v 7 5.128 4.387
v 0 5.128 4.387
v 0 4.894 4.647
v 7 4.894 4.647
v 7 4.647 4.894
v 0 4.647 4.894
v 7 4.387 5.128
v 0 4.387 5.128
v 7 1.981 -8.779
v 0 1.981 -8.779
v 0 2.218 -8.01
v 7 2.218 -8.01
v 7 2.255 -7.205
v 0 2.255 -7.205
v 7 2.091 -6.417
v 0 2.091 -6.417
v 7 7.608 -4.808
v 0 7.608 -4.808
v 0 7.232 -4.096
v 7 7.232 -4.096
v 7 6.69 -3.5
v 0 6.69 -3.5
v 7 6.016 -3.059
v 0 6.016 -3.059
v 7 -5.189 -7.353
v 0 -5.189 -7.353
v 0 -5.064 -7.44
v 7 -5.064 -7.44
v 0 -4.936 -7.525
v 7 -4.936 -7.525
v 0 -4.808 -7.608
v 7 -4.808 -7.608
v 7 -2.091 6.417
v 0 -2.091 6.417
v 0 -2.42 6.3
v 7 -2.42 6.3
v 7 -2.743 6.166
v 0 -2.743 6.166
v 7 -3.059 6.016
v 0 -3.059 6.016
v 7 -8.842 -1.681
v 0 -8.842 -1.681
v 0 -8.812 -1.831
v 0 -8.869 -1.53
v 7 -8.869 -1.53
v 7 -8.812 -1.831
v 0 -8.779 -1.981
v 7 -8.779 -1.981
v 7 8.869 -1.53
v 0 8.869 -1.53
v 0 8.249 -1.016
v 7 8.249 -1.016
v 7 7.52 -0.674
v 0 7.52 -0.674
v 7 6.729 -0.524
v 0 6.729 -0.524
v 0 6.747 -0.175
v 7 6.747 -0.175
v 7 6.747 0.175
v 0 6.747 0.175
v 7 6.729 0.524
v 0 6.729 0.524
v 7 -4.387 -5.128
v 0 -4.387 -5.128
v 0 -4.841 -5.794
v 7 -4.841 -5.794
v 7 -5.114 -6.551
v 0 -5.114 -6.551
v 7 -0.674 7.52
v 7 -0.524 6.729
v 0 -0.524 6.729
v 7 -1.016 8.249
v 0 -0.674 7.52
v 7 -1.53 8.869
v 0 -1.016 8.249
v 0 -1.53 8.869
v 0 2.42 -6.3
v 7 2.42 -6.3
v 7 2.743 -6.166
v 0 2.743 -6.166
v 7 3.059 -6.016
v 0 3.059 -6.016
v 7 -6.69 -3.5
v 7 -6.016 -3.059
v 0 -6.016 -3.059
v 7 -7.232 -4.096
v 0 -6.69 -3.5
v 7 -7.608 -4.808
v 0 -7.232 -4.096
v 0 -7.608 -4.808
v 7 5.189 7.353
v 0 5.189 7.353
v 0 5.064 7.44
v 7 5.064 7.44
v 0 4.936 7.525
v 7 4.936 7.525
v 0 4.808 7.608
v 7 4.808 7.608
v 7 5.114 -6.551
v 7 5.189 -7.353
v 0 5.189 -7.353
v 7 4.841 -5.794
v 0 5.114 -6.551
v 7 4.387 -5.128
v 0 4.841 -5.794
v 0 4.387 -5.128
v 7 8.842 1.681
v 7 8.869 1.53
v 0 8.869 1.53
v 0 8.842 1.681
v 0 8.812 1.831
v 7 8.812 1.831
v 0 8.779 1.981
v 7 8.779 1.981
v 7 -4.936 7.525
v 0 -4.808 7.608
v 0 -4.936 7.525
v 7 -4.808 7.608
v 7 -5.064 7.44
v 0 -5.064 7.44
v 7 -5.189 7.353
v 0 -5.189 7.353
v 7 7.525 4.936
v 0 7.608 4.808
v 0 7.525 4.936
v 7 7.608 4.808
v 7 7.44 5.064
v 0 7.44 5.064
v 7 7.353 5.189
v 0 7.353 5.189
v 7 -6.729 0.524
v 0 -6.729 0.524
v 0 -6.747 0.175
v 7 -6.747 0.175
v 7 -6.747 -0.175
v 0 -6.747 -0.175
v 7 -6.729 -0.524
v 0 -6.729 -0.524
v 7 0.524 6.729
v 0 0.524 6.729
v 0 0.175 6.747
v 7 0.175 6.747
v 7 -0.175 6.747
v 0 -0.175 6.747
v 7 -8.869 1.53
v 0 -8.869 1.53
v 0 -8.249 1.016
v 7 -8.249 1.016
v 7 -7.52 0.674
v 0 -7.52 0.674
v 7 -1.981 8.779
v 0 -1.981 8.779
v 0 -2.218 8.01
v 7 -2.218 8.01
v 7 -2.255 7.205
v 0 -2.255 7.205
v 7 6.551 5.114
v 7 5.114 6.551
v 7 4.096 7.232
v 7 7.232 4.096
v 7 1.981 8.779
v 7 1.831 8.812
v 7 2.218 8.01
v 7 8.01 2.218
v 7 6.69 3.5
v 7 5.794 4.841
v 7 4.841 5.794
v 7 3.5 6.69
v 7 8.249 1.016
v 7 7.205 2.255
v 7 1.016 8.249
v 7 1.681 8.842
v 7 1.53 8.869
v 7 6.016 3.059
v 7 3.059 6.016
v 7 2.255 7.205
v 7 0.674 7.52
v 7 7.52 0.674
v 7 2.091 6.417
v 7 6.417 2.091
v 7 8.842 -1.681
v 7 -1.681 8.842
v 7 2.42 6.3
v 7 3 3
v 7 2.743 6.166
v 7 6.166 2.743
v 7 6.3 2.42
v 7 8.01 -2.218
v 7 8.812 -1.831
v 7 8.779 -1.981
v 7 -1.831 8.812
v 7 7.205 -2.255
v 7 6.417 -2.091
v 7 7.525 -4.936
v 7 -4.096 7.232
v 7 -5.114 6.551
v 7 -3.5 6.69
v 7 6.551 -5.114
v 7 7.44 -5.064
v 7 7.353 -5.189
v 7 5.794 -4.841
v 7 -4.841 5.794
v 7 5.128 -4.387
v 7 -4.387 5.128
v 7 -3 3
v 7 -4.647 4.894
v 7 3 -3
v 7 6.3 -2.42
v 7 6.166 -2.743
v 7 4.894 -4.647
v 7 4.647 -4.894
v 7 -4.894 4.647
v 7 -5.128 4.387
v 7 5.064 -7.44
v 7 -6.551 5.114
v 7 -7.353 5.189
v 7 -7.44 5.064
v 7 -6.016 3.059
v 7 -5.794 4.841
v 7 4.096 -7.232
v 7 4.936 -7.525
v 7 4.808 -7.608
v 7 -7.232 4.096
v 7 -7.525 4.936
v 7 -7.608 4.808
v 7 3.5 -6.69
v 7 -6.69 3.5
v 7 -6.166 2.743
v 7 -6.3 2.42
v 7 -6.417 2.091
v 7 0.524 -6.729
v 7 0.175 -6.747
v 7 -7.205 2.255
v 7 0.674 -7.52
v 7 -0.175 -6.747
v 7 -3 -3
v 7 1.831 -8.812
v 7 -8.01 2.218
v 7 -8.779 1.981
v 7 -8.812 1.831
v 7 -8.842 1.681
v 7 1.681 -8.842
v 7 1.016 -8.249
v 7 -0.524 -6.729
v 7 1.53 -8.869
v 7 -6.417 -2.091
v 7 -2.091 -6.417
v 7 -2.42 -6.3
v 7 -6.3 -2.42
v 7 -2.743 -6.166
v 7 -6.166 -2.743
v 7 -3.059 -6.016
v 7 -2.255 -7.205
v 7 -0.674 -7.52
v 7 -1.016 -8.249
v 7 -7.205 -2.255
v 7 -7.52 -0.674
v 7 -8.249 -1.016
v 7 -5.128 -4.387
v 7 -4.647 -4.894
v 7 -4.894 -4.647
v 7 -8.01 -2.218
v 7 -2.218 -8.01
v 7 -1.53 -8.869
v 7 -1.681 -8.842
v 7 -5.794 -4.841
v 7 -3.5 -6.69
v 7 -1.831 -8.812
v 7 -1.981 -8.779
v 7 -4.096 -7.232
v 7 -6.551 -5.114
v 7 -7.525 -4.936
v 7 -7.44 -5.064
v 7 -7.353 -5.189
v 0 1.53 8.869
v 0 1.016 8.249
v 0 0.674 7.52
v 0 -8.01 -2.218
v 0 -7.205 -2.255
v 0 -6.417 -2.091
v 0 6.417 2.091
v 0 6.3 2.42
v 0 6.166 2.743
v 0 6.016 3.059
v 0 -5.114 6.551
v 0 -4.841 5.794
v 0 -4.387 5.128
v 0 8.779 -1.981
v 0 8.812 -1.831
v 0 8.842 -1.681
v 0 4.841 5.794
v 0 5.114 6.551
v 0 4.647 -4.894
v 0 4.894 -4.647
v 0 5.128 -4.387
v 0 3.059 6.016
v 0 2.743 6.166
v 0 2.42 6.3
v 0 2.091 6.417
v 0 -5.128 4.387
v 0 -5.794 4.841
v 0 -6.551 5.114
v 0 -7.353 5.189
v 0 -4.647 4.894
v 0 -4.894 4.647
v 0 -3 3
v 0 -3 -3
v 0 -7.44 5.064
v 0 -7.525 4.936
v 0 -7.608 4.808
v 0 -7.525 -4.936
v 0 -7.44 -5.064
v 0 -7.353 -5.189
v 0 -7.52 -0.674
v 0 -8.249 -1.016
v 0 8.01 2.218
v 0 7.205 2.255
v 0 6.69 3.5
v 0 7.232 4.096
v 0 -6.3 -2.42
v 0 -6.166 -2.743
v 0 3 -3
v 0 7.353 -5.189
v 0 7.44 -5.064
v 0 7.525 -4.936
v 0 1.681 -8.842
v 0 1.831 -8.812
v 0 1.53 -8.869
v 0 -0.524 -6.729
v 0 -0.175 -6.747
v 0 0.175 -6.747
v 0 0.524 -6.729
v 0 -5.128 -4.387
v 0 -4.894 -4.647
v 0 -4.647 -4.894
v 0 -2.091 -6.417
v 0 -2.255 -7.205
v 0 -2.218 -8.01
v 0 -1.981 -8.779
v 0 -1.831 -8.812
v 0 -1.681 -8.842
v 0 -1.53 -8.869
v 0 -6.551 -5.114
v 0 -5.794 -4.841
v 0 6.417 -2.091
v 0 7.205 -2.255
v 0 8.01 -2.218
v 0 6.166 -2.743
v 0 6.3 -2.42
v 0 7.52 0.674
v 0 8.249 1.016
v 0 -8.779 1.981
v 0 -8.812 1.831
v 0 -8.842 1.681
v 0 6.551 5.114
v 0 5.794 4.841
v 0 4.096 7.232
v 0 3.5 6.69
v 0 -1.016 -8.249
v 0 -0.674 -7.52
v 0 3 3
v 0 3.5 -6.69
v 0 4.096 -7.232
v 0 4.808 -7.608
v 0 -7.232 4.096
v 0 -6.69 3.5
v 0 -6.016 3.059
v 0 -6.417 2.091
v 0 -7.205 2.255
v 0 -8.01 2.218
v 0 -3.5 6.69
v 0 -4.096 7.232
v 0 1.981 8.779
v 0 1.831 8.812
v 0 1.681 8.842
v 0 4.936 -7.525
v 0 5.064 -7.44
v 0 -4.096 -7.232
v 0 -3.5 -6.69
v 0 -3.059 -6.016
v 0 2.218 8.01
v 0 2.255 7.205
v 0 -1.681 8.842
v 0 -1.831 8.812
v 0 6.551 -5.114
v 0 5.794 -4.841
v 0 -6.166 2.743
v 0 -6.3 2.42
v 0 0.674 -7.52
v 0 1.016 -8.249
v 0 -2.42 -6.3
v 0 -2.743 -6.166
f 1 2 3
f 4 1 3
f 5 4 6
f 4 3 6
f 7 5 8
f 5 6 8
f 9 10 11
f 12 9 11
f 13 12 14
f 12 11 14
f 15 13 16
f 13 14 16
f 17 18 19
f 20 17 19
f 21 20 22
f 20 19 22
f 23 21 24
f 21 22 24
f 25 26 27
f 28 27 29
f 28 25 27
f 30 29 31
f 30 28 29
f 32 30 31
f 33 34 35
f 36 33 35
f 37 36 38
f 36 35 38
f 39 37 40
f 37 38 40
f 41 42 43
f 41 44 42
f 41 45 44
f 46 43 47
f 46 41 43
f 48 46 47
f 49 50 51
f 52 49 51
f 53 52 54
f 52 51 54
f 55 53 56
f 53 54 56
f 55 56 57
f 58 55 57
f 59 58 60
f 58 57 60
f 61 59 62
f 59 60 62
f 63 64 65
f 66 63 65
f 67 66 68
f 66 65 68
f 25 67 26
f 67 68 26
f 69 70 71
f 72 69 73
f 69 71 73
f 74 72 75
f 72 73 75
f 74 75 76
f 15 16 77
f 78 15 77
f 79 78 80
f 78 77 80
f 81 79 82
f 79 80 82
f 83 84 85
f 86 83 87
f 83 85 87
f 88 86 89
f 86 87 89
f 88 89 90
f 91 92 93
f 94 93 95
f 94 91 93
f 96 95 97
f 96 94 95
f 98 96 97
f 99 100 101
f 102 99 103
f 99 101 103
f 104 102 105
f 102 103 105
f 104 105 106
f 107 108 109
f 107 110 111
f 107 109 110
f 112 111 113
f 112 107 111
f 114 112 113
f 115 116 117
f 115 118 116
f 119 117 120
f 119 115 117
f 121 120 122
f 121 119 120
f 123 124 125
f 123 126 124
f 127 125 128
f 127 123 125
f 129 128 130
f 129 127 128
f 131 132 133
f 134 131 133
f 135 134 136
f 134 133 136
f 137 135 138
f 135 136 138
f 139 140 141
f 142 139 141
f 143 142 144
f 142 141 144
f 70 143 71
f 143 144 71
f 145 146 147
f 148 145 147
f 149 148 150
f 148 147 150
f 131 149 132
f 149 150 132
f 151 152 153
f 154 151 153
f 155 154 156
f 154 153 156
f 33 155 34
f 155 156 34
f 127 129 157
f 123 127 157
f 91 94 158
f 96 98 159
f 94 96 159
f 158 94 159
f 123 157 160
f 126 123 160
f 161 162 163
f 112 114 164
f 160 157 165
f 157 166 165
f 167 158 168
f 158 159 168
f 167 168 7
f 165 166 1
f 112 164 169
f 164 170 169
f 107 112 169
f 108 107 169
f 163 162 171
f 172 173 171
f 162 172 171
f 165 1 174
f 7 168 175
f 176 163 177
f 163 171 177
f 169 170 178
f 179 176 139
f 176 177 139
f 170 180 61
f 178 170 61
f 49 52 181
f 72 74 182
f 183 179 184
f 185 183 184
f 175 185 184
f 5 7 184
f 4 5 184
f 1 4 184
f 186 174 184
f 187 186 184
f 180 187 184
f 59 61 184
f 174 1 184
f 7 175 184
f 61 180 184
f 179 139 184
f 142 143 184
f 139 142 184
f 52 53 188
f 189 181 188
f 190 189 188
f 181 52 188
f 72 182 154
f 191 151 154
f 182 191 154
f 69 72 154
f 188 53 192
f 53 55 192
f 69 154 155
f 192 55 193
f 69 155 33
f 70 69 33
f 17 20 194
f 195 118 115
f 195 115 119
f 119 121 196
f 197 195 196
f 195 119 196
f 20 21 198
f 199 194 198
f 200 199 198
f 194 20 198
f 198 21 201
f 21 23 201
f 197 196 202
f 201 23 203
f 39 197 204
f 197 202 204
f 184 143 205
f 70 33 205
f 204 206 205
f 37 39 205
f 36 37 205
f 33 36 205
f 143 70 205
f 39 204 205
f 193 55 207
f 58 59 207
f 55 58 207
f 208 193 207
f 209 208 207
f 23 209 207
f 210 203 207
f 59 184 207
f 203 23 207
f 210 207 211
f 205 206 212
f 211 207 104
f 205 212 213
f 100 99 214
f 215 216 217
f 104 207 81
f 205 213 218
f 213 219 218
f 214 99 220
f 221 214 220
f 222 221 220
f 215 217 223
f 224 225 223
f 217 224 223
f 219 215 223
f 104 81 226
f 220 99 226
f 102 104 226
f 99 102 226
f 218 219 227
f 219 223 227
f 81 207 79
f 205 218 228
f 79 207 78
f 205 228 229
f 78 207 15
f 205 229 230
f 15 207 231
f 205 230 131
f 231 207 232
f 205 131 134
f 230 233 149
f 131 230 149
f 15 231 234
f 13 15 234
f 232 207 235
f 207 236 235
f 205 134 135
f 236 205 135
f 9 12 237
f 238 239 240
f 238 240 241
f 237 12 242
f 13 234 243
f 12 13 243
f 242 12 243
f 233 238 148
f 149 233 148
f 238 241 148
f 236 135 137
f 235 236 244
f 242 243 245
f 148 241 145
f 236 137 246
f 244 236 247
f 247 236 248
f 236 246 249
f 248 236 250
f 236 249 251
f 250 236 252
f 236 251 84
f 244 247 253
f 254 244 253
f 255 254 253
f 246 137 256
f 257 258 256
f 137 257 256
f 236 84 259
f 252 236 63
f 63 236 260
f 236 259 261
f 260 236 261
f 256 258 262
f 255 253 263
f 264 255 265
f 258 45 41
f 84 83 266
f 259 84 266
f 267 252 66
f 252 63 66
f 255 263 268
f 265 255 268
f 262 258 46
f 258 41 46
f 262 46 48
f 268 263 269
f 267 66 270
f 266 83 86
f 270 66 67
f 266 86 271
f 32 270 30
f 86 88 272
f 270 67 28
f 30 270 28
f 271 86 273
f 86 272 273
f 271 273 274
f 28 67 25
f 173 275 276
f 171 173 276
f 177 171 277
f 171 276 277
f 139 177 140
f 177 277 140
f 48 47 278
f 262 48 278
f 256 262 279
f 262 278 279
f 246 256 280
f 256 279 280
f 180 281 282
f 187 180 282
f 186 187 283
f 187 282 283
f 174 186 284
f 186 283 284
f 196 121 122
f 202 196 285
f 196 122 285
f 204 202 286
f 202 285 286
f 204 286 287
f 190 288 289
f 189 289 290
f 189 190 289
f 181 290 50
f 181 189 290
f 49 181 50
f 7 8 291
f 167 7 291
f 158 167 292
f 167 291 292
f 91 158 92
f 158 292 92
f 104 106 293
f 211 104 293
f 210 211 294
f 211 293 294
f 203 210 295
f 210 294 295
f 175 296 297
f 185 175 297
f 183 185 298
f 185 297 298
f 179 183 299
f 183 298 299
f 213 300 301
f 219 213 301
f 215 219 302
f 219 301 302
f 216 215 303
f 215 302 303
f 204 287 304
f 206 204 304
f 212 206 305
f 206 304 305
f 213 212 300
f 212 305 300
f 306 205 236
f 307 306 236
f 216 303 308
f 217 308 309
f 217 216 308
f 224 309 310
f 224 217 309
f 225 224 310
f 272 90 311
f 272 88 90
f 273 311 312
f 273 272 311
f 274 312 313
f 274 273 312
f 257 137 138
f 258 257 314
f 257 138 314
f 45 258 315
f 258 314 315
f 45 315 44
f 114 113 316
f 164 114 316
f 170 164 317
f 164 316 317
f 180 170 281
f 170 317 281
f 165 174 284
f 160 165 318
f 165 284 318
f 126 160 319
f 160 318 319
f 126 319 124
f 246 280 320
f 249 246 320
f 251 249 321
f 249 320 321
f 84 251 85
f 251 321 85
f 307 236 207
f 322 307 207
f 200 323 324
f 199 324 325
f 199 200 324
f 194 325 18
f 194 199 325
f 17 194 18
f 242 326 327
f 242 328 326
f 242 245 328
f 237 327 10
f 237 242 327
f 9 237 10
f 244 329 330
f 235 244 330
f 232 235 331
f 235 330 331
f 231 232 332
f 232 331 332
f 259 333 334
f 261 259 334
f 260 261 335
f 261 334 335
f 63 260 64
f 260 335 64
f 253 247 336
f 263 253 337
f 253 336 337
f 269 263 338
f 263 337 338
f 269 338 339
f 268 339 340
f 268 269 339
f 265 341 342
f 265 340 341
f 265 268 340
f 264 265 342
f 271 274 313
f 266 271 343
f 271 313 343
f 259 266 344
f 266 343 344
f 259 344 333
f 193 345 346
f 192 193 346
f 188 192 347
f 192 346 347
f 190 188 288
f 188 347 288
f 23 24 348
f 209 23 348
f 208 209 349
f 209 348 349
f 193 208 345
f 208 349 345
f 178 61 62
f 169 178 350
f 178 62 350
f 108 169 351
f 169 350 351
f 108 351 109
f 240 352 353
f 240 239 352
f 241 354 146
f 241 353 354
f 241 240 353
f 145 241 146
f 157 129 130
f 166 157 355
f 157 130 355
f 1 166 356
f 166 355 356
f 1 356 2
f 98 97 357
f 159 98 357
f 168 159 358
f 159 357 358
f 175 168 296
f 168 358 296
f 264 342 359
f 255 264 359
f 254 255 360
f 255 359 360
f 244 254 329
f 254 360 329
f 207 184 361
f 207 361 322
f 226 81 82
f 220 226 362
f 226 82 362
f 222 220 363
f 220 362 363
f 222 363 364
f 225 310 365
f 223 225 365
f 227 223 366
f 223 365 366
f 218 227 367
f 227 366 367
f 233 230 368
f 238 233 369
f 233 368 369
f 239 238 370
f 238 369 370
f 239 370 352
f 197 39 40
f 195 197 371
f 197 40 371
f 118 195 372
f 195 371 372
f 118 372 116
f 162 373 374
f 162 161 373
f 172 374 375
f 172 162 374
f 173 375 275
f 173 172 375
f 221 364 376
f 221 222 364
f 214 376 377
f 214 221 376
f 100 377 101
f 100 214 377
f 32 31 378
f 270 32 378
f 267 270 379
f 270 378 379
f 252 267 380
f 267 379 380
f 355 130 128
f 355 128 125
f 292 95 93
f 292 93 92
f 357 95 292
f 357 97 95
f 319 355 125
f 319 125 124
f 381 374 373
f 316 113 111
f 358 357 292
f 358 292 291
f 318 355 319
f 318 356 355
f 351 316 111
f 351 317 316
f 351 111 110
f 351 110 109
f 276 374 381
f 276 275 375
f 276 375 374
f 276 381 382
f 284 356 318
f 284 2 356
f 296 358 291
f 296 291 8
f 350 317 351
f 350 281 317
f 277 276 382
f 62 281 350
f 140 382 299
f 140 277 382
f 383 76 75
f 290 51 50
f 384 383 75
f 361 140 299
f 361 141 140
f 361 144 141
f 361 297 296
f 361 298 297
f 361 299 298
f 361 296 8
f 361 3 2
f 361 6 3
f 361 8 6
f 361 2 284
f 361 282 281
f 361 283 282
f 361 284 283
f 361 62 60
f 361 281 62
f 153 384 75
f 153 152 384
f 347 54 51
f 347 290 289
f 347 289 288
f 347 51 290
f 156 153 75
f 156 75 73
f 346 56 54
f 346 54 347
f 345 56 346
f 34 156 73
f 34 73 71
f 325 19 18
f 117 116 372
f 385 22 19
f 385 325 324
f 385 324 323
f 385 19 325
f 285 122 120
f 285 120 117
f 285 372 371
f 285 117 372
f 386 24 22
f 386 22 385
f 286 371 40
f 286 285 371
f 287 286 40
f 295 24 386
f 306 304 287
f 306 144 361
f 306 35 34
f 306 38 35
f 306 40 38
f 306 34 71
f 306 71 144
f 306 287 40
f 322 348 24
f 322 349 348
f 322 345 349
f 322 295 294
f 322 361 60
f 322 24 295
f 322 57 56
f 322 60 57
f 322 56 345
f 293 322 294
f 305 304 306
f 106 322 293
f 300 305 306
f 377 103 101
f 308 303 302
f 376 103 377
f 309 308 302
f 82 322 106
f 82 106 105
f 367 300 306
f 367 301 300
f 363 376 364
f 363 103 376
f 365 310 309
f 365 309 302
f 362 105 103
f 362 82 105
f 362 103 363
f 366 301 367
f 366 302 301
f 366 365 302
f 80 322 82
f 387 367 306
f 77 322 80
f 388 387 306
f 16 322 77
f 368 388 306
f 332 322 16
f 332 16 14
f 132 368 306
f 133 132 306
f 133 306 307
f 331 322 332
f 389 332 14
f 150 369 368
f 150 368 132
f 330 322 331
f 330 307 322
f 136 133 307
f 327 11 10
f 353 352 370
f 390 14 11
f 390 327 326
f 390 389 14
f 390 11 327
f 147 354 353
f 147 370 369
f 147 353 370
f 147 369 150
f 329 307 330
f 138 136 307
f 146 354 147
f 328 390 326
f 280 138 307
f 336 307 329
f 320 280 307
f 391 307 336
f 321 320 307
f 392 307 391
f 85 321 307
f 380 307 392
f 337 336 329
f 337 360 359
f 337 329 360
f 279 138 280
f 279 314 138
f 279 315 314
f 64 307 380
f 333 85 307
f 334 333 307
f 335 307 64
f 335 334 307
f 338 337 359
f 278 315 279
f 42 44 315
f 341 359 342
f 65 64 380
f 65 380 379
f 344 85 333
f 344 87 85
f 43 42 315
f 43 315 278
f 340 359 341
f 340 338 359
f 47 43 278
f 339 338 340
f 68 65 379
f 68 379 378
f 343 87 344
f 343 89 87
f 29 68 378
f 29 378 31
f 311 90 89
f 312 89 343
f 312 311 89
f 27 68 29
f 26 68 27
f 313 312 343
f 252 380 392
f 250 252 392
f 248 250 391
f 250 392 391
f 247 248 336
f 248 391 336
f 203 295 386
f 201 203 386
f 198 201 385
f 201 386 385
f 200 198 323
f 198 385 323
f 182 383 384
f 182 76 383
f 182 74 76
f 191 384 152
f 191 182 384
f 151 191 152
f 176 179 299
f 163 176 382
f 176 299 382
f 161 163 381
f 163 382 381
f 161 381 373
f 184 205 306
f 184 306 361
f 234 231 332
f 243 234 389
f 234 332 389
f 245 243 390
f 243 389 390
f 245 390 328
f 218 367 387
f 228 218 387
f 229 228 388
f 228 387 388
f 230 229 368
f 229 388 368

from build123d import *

# Parameters (mm, degrees)
BASPROSKE_W        = 7
BASPROSKE_H        = 9
TOOTHCUT_DEPTH     = 15.525839046
TEETHCUTS_COUNT    = 16
BORSKE_R           = 3
BORE_DEPTH         = 50.0001016
SKETCH1_W          = 6
SKETCH1_H          = 6
CUT_EXTRUDE1_DEPTH = 10


with BuildPart() as part:
    # BasProSke → Base-Revolve (revolve)
    with BuildSketch(Plane(origin=(0, 0, 0), x_dir=(1, 0, 0), z_dir=(0, 1, 0)), mode=Mode.PRIVATE) as base_revolve_sk:
        with Locations((3.5, 4.5)):
            Rectangle(BASPROSKE_W, BASPROSKE_H)
    revolve(base_revolve_sk.sketch.rotate(Axis((-10, 0, 0), (1, 0, 0)), 180), axis=Axis((-10, 0, 0), (1, 0, 0)))

    # TooCutSke → ToothCut (cut, through all)
    with BuildSketch(Plane(origin=(0, 0, 0), x_dir=(0, 0, -1), z_dir=(1, 0, 0))):
        with BuildLine():
            ThreePointArc((0.523792937, 6.728643397), (0, 6.749), (-0.523792937, 6.728643397))
            ThreePointArc((-0.523792937, 6.728643397), (-0.828704482, 7.90962059), (-1.553355277, 8.890721711))
            ThreePointArc((-1.553355277, 8.890721711), (0, 9.0254), (1.553355277, 8.890721711))
            ThreePointArc((1.553355277, 8.890721711), (0.828704482, 7.90962059), (0.523792937, 6.728643397))
        make_face()
    toothcut = extrude(amount=TOOTHCUT_DEPTH, mode=Mode.SUBTRACT)

    # TeethCuts: ToothCut ×16 about axis
    teethcuts_axis = Axis((0, 0, 0), (1, 0, 0))
    for i in range(1, TEETHCUTS_COUNT):
        add(toothcut.rotate(teethcuts_axis, i * 360 / TEETHCUTS_COUNT), mode=Mode.SUBTRACT)

    # BorSke → Bore (cut, symmetric)
    with BuildSketch(Plane(origin=(0, 0, 0), x_dir=(0, 0, -1), z_dir=(1, 0, 0))):
        with Locations(Location((0, 0, 0), (0, 0, 180))):
            Circle(BORSKE_R)
    extrude(amount=BORE_DEPTH, both=True, mode=Mode.SUBTRACT)

    # Sketch1 → Cut-Extrude1 (cut)
    with BuildSketch(Plane(origin=(7, 0, 0), x_dir=(0, 0, -1), z_dir=(1, 0, 0))):
        Rectangle(SKETCH1_W, SKETCH1_H)
    extrude(amount=-CUT_EXTRUDE1_DEPTH, mode=Mode.SUBTRACT)


solid = part.part
